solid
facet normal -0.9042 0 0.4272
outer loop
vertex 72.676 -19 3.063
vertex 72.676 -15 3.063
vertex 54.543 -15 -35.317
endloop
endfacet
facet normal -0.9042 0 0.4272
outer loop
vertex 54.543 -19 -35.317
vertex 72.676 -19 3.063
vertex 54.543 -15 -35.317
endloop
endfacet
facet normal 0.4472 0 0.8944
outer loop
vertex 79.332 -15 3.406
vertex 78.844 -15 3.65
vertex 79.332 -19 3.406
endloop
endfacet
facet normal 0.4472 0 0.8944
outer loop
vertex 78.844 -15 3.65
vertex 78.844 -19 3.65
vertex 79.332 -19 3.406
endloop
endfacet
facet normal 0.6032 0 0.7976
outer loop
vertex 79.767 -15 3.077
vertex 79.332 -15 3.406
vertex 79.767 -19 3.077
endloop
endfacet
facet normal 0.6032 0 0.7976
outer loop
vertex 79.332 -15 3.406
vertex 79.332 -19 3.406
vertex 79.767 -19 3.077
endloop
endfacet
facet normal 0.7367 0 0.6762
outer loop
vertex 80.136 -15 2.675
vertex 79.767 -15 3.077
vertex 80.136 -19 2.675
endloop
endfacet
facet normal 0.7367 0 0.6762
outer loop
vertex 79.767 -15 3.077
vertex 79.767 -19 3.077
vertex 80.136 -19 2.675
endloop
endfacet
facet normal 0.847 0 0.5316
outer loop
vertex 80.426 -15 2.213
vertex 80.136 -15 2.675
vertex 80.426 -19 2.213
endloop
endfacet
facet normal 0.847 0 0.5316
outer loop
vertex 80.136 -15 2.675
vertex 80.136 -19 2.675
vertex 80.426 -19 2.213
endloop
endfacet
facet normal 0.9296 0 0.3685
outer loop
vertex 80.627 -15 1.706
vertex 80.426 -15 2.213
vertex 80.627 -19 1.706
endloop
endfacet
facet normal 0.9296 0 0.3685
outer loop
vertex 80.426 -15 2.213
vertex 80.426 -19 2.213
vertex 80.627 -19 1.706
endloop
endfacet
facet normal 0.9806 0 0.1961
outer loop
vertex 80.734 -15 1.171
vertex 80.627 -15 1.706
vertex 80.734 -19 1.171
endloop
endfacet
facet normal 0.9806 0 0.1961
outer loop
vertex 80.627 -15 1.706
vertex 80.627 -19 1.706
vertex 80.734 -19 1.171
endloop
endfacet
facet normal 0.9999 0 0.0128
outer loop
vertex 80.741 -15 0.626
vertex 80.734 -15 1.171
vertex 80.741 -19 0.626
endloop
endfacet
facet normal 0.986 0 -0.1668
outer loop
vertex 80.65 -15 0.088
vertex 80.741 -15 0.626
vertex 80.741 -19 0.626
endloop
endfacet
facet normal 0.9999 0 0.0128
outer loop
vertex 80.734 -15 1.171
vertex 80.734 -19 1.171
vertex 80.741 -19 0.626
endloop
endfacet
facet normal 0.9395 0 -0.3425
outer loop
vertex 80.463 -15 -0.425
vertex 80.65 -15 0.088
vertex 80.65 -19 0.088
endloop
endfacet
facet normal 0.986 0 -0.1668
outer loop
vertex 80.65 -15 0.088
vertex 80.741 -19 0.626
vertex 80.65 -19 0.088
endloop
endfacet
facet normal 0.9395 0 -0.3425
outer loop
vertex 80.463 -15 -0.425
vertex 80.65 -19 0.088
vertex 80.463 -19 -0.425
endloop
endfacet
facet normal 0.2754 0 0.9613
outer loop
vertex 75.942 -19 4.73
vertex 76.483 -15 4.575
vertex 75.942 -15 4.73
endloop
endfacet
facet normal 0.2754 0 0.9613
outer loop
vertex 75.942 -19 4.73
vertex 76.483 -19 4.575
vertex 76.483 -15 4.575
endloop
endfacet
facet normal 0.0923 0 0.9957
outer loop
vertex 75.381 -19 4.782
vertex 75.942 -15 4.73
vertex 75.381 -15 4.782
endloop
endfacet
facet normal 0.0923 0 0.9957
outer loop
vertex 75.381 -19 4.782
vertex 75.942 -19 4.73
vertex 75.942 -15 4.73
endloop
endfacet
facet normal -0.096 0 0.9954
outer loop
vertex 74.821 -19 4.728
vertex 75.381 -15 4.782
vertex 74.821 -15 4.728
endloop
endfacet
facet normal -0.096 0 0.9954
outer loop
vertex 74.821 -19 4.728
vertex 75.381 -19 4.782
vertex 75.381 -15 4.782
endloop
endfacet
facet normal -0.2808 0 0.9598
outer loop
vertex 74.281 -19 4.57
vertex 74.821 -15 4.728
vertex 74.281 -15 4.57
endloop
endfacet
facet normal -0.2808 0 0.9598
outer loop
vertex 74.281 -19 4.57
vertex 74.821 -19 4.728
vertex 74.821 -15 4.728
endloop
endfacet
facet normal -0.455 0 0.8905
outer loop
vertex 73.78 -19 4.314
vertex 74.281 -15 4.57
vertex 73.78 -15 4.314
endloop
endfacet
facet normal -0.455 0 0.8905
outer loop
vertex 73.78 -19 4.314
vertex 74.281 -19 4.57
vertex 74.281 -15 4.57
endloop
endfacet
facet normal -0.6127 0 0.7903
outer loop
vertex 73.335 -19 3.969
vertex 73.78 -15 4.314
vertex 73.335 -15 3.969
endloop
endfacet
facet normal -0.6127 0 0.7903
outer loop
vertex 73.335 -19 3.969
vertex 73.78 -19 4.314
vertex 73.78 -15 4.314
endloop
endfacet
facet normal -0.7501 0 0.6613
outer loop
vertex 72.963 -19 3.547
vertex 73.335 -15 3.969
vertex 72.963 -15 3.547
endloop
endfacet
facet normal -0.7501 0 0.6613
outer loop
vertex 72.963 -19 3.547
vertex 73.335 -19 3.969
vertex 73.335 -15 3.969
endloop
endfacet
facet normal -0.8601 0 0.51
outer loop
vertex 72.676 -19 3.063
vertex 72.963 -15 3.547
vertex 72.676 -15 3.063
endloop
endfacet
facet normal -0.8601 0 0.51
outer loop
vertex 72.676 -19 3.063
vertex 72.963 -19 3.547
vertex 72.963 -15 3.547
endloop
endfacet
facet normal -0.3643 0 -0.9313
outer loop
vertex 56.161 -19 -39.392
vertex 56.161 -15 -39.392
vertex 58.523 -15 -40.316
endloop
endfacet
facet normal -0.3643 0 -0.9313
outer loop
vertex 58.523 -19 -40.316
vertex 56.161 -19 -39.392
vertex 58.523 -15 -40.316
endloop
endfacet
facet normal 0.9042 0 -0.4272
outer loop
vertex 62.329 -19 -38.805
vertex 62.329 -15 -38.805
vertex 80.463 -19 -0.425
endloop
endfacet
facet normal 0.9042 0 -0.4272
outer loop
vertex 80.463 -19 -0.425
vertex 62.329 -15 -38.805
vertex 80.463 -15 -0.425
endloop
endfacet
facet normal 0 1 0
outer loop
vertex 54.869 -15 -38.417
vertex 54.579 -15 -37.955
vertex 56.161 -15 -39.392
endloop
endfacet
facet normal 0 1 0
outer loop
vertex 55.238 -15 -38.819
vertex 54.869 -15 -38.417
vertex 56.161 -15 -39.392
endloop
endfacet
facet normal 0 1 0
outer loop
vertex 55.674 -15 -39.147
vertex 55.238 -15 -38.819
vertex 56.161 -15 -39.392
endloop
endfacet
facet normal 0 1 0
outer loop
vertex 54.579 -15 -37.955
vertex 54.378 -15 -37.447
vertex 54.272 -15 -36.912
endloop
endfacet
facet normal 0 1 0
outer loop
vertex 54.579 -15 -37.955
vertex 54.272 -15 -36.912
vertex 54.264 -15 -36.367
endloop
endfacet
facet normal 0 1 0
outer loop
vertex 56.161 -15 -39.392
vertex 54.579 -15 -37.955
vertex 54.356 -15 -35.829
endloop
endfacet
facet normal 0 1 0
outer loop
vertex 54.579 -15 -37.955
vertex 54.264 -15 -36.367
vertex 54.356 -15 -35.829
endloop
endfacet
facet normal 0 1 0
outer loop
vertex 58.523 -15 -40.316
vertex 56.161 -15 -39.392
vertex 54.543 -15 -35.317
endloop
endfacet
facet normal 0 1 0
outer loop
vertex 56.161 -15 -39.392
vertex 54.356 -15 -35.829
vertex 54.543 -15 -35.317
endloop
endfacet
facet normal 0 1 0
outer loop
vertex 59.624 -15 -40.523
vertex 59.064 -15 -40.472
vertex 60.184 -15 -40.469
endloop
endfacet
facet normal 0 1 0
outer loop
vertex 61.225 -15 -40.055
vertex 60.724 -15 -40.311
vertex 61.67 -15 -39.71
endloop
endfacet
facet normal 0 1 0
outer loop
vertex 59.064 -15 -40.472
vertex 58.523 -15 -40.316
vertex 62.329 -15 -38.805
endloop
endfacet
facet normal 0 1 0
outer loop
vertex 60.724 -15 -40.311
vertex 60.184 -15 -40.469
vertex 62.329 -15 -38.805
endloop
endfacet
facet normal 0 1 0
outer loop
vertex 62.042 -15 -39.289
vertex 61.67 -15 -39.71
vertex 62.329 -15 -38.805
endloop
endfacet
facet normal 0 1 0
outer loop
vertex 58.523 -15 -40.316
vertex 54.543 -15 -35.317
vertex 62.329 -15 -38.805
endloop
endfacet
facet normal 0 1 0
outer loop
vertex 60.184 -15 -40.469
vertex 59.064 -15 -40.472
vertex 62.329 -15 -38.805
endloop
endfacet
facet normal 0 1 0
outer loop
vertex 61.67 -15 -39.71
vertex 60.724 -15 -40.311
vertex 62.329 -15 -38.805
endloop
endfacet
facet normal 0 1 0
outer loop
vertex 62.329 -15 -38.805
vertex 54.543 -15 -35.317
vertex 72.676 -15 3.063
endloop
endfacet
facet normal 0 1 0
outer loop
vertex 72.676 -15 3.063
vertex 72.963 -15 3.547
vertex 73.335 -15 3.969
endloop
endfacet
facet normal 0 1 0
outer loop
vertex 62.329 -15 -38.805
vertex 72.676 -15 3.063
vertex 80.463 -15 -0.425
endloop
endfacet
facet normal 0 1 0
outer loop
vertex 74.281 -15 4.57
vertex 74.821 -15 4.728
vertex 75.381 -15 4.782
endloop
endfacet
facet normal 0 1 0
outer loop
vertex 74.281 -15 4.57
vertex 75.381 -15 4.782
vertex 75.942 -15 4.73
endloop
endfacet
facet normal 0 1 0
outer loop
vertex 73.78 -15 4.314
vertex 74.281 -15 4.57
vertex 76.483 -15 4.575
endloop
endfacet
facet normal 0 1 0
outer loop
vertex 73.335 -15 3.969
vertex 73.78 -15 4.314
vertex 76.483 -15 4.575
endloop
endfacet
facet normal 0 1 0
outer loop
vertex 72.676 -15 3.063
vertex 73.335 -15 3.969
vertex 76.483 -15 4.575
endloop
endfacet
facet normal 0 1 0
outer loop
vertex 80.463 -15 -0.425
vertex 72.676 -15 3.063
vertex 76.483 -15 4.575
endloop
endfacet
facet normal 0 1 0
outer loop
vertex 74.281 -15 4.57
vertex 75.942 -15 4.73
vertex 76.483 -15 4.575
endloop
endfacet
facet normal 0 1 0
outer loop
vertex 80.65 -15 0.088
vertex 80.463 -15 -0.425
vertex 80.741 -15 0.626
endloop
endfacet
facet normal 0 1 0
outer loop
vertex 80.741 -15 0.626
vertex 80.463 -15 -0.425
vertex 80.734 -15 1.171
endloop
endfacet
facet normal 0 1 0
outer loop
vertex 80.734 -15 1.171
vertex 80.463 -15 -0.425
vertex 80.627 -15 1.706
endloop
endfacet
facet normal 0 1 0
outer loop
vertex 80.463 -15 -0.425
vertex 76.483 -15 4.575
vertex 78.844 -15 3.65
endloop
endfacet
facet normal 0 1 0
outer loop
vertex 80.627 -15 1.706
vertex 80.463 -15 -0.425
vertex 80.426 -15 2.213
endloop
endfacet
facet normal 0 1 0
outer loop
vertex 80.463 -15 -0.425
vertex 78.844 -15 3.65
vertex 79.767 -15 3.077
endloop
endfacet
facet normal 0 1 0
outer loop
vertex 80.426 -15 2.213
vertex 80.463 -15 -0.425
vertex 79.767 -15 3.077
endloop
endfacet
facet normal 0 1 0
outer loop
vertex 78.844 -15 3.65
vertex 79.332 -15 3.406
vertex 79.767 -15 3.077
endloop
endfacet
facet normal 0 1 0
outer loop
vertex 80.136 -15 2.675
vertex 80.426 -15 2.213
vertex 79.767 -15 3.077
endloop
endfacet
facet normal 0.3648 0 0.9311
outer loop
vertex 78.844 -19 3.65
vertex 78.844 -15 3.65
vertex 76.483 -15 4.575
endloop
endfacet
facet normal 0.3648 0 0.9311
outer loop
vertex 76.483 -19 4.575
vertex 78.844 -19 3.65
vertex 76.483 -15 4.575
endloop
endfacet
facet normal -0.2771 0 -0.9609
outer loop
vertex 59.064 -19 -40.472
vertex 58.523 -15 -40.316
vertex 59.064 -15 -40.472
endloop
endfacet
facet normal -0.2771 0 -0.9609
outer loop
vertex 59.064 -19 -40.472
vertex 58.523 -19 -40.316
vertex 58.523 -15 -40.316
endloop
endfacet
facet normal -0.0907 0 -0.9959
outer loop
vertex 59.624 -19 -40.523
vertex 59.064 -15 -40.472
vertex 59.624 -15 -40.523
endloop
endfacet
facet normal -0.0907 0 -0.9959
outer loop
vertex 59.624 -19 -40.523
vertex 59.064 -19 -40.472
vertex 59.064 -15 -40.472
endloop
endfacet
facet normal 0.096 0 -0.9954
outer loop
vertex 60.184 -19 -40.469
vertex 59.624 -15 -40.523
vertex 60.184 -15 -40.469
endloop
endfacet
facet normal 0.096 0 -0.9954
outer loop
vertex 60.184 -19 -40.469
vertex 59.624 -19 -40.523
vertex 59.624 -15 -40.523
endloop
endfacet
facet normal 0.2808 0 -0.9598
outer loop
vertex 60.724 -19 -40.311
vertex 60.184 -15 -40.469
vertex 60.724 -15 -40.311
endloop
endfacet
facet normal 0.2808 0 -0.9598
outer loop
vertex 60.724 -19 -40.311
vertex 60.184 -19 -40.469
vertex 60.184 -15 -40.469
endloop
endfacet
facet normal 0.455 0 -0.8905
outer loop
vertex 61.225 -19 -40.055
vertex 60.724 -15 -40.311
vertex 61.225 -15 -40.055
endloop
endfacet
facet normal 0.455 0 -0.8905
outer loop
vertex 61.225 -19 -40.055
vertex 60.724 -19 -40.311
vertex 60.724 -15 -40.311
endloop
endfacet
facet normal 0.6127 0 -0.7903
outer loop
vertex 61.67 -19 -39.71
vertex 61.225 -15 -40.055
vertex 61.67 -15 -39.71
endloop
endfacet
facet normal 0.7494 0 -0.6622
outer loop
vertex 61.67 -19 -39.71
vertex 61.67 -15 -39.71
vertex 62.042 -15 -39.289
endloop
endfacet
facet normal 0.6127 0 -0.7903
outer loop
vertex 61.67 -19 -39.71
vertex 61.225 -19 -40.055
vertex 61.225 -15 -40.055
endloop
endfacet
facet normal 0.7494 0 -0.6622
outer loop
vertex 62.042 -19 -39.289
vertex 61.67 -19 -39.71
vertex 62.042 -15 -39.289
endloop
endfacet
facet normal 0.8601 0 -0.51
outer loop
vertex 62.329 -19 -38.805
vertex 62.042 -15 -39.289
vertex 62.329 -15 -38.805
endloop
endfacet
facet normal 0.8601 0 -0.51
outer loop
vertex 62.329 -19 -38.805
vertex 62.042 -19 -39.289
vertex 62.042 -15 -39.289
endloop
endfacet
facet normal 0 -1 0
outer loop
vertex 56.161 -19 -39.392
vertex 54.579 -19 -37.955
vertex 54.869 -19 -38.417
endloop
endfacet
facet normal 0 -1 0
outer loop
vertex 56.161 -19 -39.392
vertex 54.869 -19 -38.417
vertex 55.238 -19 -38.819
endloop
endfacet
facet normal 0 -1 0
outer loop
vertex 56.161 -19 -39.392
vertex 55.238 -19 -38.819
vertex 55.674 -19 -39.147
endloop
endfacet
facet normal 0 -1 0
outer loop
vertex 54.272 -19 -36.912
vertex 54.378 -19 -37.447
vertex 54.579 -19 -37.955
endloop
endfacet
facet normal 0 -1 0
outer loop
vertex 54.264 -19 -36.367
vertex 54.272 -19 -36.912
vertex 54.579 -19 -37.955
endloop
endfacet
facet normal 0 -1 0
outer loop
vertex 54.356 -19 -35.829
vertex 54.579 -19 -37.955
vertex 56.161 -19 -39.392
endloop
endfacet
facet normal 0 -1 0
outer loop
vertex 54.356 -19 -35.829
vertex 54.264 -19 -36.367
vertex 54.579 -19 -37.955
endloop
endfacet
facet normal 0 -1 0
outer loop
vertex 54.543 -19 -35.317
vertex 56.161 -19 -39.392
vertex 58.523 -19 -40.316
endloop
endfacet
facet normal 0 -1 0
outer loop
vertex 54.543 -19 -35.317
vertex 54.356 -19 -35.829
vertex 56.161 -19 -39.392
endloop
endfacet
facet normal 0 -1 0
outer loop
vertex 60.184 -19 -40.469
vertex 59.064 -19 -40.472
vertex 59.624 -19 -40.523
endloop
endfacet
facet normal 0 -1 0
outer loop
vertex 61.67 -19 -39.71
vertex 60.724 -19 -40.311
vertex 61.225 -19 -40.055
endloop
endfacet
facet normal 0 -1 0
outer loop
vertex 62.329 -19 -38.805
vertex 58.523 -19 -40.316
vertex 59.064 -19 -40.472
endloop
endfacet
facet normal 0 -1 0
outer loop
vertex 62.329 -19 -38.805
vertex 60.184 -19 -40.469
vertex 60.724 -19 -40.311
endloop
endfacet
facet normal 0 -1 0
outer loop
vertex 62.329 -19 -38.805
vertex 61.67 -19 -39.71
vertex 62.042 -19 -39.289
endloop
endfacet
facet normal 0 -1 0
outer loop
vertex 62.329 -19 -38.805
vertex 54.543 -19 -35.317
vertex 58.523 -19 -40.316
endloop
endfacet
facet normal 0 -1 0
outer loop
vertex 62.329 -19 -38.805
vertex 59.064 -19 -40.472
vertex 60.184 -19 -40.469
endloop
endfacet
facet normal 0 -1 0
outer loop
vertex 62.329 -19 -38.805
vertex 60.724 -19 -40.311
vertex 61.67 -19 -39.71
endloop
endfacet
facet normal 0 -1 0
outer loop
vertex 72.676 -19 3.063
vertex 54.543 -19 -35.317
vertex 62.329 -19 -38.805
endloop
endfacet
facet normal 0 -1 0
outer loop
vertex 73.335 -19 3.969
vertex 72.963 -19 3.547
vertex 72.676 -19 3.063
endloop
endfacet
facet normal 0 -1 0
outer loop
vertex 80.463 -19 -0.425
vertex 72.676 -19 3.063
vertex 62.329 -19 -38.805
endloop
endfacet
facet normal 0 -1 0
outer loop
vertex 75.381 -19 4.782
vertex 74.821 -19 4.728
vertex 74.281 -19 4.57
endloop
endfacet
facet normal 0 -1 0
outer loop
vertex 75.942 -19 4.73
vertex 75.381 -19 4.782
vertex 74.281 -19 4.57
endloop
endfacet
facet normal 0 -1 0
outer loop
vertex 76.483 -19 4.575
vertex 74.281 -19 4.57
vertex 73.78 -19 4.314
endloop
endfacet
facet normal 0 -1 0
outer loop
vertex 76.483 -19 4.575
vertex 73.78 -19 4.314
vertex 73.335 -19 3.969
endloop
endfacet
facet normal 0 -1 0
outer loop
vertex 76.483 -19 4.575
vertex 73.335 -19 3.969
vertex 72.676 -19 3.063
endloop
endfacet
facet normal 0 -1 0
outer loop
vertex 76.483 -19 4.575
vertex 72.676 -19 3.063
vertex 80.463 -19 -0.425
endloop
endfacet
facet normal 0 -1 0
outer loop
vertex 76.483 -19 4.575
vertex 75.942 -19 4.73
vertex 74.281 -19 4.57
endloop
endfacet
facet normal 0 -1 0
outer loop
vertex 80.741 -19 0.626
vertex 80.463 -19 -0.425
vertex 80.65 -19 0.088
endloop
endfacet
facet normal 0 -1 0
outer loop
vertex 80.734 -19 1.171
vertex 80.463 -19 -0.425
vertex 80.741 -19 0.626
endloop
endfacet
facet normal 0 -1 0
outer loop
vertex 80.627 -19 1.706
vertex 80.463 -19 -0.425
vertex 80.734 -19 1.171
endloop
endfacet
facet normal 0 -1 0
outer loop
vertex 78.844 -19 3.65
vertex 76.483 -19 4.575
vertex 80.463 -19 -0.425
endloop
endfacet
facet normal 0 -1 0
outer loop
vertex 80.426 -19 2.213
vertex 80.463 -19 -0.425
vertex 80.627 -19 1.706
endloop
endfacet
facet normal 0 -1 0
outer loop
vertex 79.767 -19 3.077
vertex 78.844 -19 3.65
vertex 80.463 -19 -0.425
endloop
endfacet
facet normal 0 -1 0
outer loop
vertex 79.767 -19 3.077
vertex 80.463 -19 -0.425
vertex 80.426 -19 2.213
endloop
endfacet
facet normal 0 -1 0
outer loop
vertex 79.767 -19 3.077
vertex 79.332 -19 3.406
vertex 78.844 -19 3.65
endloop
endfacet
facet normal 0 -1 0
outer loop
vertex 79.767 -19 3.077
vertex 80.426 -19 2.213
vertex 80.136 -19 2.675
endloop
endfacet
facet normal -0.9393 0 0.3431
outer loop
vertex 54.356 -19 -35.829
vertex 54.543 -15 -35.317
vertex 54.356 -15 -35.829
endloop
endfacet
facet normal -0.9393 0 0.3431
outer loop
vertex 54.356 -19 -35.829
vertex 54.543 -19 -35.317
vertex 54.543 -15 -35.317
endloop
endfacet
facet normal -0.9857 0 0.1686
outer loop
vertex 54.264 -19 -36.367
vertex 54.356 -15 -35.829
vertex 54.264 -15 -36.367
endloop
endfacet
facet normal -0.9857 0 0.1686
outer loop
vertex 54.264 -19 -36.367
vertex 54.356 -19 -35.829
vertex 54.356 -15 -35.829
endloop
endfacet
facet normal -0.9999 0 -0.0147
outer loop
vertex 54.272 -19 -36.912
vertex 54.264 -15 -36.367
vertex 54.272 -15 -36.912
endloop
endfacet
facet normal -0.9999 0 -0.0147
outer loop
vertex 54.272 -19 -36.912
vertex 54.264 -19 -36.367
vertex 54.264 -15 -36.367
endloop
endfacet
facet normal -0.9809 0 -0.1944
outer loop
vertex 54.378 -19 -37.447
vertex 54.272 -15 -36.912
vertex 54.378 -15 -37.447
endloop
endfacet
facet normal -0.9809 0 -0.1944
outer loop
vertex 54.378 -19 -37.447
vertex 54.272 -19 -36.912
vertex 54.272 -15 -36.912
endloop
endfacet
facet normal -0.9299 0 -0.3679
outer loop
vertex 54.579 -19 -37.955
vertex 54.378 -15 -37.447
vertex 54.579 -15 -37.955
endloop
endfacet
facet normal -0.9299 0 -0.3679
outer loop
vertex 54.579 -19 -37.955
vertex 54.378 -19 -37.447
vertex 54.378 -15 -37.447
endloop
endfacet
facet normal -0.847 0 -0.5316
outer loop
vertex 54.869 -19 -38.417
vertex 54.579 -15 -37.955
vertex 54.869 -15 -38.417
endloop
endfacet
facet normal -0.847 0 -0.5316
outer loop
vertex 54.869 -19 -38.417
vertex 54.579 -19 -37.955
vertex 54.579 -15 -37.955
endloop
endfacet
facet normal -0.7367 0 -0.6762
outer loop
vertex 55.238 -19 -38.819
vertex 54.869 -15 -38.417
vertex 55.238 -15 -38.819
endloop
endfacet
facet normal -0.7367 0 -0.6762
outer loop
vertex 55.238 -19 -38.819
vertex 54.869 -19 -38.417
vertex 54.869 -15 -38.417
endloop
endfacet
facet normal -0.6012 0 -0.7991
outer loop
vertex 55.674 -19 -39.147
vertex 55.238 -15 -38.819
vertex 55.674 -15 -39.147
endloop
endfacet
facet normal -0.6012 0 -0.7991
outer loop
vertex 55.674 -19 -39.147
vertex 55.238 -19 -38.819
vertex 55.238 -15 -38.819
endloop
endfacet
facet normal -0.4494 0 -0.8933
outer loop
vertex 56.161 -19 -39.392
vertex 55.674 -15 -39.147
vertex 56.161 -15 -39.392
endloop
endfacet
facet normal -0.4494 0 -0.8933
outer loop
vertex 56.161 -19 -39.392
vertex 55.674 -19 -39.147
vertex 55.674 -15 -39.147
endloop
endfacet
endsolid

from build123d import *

# Parameters (mm, degrees)
PAD021_DEPTH = 4
FILLET017_R  = 3


with BuildPart() as fillet017:
    # Sketch025 → Pad021 (new body)
    with BuildSketch(Plane.XZ.offset(15)):
        Polygon((-5.834702, 2.479193), (2.126768, 5.596979), (22.829249, -38.220491), (14.867778, -41.338277), align=None)
    extrude(amount=PAD021_DEPTH)

    # Fillet017
    fillet017_edges = [fillet017.edges().sort_by_distance(p)[0] for p in [
        (-5.834702, -17, 2.479193),
        (2.126768, -17, 5.596979),
        (22.829249, -17, -38.220491),
        (14.867778, -17, -41.338277),
    ]]
    fillet(fillet017_edges, radius=FILLET017_R)


with BuildPart() as part_mirroring013:
    # Part__Mirroring013: instance of Fillet017
    add(fillet017.part.mirror(Plane(origin=(0, 0, 0), x_dir=(0, -1, 0), z_dir=(1, 0, 0))))


with BuildPart() as part_mirroring013_1:
    # Part__Mirroring013 placement: moved
    add(part_mirroring013.part.moved(Location((76, 0, 0))))


solid = part_mirroring013_1.part
